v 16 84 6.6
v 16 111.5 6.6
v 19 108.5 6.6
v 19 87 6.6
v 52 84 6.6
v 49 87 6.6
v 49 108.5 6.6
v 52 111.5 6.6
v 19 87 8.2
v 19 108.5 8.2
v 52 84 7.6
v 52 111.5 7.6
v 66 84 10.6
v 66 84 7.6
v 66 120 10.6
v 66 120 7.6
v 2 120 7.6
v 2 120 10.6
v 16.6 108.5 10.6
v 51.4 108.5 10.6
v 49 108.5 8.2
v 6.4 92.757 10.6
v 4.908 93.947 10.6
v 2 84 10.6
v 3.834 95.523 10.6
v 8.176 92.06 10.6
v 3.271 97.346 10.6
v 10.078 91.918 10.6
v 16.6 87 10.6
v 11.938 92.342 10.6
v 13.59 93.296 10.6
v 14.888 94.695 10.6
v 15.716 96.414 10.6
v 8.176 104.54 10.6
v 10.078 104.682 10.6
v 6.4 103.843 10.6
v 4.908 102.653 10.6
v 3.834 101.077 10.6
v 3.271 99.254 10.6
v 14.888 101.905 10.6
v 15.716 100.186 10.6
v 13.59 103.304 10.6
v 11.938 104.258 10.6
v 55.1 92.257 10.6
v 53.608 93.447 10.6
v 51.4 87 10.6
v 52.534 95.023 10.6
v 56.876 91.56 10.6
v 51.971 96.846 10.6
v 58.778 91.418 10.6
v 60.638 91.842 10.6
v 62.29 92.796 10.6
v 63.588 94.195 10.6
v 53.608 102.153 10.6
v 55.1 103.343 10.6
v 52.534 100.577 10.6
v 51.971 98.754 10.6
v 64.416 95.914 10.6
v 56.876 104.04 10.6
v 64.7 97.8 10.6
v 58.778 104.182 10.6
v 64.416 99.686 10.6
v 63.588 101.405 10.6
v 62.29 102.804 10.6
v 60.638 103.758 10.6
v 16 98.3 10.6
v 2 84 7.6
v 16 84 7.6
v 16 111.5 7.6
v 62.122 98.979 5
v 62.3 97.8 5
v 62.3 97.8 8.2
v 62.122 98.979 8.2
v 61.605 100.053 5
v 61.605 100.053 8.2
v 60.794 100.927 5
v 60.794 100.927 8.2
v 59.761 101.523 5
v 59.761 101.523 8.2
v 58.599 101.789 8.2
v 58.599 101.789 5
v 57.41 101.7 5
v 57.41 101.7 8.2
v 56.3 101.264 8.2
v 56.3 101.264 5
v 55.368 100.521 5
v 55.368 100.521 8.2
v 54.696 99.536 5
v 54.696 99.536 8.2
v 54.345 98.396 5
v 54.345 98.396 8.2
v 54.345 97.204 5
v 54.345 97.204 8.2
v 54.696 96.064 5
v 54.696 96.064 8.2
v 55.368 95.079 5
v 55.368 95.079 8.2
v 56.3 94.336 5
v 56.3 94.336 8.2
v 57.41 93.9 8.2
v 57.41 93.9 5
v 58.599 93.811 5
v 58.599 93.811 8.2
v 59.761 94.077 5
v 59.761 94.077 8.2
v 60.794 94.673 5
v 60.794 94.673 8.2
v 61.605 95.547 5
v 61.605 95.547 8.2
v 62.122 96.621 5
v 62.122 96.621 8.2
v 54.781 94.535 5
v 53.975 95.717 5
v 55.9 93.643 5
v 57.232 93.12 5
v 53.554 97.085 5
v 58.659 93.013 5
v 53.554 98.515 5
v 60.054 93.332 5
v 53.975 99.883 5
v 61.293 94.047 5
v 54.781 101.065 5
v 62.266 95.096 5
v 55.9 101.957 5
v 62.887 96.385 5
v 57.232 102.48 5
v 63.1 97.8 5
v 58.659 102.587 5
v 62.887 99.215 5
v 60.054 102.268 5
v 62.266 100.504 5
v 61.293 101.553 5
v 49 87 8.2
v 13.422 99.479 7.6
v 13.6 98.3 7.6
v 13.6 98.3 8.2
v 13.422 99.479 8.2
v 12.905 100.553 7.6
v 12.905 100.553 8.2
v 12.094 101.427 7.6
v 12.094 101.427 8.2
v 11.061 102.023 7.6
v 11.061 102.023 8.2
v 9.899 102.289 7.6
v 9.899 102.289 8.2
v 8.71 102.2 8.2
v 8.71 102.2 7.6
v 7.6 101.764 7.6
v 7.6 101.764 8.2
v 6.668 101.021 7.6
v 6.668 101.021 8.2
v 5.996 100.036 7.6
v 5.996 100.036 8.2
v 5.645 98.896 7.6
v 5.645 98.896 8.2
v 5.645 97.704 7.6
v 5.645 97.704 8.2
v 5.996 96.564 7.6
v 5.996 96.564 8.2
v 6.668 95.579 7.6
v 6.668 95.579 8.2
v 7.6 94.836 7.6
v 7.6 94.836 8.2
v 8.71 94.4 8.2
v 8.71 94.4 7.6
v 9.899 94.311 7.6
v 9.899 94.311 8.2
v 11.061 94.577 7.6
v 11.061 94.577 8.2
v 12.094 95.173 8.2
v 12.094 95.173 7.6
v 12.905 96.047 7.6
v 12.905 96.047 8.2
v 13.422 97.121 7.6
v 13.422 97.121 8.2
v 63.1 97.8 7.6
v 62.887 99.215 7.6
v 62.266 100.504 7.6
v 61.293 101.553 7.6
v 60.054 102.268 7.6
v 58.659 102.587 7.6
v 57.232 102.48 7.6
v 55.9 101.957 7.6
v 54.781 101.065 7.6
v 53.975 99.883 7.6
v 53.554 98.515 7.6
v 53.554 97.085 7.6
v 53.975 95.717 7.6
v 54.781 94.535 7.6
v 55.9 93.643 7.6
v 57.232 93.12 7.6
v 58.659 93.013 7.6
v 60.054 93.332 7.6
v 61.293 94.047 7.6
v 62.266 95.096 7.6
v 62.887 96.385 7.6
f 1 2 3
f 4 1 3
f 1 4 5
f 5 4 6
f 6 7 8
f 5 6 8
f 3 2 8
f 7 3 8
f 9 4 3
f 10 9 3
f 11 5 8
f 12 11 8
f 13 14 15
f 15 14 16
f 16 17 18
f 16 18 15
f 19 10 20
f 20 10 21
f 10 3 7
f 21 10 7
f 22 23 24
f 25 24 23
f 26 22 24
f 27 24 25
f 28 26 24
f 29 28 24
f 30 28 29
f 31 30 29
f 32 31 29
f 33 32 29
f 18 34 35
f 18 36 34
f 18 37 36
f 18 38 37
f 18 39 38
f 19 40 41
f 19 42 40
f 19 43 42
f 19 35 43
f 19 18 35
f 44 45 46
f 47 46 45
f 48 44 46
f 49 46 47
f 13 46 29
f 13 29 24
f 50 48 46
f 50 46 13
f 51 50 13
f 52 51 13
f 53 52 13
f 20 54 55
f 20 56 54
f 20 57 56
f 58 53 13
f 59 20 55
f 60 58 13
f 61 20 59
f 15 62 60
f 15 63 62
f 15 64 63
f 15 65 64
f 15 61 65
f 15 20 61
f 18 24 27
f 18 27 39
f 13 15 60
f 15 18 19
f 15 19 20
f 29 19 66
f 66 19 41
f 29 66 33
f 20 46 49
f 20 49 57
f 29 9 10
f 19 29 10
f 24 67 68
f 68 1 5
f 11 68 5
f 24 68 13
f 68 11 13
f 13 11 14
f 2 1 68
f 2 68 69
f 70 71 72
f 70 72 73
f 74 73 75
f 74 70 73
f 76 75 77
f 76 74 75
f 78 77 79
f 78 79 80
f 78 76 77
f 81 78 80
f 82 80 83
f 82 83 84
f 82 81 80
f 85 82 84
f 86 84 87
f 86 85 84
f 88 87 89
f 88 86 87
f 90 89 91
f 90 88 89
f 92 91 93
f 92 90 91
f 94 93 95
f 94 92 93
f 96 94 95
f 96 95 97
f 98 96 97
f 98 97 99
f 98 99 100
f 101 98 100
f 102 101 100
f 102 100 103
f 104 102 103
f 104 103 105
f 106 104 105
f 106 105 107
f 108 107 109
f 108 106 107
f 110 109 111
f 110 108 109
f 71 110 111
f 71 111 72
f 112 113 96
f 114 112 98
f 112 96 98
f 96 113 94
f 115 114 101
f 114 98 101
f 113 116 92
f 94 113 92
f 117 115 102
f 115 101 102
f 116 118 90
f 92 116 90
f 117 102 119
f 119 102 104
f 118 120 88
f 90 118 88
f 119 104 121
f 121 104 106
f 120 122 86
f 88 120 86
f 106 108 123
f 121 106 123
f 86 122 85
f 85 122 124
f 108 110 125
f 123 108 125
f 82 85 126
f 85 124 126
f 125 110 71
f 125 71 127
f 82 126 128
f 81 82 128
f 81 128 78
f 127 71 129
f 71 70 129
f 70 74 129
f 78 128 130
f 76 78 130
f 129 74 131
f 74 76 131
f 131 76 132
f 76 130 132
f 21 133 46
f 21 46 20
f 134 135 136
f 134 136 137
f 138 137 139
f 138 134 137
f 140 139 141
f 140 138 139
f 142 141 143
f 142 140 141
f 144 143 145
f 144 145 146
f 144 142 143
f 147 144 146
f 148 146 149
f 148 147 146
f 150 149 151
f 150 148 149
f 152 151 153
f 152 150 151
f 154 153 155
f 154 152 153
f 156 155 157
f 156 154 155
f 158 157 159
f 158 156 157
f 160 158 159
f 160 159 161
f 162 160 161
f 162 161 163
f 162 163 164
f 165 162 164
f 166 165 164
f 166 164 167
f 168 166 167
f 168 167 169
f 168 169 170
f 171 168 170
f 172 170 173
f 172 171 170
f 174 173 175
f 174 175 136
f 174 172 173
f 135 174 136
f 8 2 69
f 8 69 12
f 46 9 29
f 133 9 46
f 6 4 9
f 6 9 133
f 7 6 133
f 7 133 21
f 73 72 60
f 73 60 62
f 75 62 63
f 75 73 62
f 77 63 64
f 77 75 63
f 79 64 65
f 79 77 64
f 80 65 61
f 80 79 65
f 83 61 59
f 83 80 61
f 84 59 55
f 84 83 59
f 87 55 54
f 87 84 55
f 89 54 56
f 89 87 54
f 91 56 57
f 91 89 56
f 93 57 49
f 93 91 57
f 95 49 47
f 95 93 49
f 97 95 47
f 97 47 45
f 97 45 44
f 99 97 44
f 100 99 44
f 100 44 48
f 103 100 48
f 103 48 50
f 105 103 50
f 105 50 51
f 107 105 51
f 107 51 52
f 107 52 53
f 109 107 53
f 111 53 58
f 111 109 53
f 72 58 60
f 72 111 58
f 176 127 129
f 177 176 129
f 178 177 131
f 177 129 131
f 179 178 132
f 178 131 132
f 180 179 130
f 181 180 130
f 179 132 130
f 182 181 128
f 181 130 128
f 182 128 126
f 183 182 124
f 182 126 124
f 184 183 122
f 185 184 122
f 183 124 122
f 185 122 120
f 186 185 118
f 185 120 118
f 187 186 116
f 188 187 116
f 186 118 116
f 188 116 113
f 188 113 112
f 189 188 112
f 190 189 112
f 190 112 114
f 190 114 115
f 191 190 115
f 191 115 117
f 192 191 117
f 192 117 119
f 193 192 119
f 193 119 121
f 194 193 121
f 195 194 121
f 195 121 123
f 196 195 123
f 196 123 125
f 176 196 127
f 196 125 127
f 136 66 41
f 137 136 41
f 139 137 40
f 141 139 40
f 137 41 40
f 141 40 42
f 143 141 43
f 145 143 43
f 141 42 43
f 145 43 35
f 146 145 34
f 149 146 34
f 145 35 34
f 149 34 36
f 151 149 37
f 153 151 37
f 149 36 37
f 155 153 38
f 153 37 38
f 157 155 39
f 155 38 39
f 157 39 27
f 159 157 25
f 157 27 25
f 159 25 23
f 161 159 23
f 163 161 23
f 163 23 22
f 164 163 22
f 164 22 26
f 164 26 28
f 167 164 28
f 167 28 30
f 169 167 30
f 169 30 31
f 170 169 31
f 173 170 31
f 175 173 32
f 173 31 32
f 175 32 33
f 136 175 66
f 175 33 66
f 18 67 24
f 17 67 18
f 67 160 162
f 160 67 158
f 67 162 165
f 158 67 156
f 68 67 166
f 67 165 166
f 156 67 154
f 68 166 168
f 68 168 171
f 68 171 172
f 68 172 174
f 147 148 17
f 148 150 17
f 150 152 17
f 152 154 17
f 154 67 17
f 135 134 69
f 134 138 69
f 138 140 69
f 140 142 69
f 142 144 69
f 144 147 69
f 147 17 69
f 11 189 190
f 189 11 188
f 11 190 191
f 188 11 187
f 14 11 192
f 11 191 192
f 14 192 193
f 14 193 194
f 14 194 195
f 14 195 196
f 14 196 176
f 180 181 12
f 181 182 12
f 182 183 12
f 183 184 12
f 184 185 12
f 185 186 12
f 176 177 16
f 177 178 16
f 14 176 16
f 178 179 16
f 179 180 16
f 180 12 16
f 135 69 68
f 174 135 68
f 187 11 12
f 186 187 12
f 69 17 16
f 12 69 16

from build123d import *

# Parameters (mm, degrees)
SKETCH038_W      = 36
SKETCH038_H      = 27.5
SKETCH038_W_2    = 30
SKETCH038_H_2    = 21.5
EXTRUDE026_DEPTH = 1
SKETCH039_R      = 4.8
SKETCH039_R_2    = 4
EXTRUDE027_DEPTH = 2.6
SKETCH037_W      = 64
SKETCH037_H      = 36
SKETCH037_R      = 4
SKETCH037_W_2    = 30
SKETCH037_H_2    = 21.5
EXTRUDE025_DEPTH = 3
CHAMFER_SIZE     = 2.4


with BuildPart() as basebevel001:
    # Sketch038 → Extrude026 (new body)
    with BuildSketch(Plane.XY):
        with Locations((34, 97.75)):
            Rectangle(SKETCH038_W, SKETCH038_H)
        with Locations((34, 97.75)):
            Rectangle(SKETCH038_W_2, SKETCH038_H_2, mode=Mode.SUBTRACT)
    extrude(amount=EXTRUDE026_DEPTH)


with BuildPart() as basebevel001_1:
    # Extrude026 placement: moved
    add(basebevel001.part.moved(Location((0, 0, 6.6))))


with BuildPart() as basebutton_t001:
    # Sketch039 → Extrude027 (new body)
    with BuildSketch(Plane.XY):
        with Locations((58.3, 97.8)):
            Circle(SKETCH039_R)
        with Locations((58.3, 97.8)):
            Circle(SKETCH039_R_2, mode=Mode.SUBTRACT)
    extrude(amount=EXTRUDE027_DEPTH)


with BuildPart() as basebutton_t001_1:
    # Extrude027 placement: moved
    add(basebutton_t001.part.moved(Location((0, 0, 5))))


with BuildPart() as ui_plate_shp:
    # Sketch037 → Extrude025 (new body)
    with BuildSketch(Plane.XY):
        with Locations((34, 102)):
            Rectangle(SKETCH037_W, SKETCH037_H)
        with Locations((9.6, 98.3)):
            Circle(SKETCH037_R, mode=Mode.SUBTRACT)
        with Locations((58.3, 97.8)):
            Circle(SKETCH037_R, mode=Mode.SUBTRACT)
        with Locations((34, 97.75)):
            Rectangle(SKETCH037_W_2, SKETCH037_H_2, mode=Mode.SUBTRACT)
    extrude(amount=EXTRUDE025_DEPTH)


with BuildPart() as ui_plate_shp_1:
    # Extrude025 placement: moved
    add(ui_plate_shp.part.moved(Location((0, 0, 7.6))))

    # Fusion015: union basebevel001, basebutton_t001
    add(basebevel001_1.part)
    add(basebutton_t001_1.part)

    # Chamfer
    chamfer_edges = [ui_plate_shp_1.edges().sort_by_distance(p)[0] for p in [
        (54.3, 97.8, 10.6),
        (5.6, 98.3, 10.6),
        (49, 97.75, 10.6),
        (19, 97.75, 10.6),
    ]]
    chamfer(chamfer_edges, length=CHAMFER_SIZE)


solid = ui_plate_shp_1.part
